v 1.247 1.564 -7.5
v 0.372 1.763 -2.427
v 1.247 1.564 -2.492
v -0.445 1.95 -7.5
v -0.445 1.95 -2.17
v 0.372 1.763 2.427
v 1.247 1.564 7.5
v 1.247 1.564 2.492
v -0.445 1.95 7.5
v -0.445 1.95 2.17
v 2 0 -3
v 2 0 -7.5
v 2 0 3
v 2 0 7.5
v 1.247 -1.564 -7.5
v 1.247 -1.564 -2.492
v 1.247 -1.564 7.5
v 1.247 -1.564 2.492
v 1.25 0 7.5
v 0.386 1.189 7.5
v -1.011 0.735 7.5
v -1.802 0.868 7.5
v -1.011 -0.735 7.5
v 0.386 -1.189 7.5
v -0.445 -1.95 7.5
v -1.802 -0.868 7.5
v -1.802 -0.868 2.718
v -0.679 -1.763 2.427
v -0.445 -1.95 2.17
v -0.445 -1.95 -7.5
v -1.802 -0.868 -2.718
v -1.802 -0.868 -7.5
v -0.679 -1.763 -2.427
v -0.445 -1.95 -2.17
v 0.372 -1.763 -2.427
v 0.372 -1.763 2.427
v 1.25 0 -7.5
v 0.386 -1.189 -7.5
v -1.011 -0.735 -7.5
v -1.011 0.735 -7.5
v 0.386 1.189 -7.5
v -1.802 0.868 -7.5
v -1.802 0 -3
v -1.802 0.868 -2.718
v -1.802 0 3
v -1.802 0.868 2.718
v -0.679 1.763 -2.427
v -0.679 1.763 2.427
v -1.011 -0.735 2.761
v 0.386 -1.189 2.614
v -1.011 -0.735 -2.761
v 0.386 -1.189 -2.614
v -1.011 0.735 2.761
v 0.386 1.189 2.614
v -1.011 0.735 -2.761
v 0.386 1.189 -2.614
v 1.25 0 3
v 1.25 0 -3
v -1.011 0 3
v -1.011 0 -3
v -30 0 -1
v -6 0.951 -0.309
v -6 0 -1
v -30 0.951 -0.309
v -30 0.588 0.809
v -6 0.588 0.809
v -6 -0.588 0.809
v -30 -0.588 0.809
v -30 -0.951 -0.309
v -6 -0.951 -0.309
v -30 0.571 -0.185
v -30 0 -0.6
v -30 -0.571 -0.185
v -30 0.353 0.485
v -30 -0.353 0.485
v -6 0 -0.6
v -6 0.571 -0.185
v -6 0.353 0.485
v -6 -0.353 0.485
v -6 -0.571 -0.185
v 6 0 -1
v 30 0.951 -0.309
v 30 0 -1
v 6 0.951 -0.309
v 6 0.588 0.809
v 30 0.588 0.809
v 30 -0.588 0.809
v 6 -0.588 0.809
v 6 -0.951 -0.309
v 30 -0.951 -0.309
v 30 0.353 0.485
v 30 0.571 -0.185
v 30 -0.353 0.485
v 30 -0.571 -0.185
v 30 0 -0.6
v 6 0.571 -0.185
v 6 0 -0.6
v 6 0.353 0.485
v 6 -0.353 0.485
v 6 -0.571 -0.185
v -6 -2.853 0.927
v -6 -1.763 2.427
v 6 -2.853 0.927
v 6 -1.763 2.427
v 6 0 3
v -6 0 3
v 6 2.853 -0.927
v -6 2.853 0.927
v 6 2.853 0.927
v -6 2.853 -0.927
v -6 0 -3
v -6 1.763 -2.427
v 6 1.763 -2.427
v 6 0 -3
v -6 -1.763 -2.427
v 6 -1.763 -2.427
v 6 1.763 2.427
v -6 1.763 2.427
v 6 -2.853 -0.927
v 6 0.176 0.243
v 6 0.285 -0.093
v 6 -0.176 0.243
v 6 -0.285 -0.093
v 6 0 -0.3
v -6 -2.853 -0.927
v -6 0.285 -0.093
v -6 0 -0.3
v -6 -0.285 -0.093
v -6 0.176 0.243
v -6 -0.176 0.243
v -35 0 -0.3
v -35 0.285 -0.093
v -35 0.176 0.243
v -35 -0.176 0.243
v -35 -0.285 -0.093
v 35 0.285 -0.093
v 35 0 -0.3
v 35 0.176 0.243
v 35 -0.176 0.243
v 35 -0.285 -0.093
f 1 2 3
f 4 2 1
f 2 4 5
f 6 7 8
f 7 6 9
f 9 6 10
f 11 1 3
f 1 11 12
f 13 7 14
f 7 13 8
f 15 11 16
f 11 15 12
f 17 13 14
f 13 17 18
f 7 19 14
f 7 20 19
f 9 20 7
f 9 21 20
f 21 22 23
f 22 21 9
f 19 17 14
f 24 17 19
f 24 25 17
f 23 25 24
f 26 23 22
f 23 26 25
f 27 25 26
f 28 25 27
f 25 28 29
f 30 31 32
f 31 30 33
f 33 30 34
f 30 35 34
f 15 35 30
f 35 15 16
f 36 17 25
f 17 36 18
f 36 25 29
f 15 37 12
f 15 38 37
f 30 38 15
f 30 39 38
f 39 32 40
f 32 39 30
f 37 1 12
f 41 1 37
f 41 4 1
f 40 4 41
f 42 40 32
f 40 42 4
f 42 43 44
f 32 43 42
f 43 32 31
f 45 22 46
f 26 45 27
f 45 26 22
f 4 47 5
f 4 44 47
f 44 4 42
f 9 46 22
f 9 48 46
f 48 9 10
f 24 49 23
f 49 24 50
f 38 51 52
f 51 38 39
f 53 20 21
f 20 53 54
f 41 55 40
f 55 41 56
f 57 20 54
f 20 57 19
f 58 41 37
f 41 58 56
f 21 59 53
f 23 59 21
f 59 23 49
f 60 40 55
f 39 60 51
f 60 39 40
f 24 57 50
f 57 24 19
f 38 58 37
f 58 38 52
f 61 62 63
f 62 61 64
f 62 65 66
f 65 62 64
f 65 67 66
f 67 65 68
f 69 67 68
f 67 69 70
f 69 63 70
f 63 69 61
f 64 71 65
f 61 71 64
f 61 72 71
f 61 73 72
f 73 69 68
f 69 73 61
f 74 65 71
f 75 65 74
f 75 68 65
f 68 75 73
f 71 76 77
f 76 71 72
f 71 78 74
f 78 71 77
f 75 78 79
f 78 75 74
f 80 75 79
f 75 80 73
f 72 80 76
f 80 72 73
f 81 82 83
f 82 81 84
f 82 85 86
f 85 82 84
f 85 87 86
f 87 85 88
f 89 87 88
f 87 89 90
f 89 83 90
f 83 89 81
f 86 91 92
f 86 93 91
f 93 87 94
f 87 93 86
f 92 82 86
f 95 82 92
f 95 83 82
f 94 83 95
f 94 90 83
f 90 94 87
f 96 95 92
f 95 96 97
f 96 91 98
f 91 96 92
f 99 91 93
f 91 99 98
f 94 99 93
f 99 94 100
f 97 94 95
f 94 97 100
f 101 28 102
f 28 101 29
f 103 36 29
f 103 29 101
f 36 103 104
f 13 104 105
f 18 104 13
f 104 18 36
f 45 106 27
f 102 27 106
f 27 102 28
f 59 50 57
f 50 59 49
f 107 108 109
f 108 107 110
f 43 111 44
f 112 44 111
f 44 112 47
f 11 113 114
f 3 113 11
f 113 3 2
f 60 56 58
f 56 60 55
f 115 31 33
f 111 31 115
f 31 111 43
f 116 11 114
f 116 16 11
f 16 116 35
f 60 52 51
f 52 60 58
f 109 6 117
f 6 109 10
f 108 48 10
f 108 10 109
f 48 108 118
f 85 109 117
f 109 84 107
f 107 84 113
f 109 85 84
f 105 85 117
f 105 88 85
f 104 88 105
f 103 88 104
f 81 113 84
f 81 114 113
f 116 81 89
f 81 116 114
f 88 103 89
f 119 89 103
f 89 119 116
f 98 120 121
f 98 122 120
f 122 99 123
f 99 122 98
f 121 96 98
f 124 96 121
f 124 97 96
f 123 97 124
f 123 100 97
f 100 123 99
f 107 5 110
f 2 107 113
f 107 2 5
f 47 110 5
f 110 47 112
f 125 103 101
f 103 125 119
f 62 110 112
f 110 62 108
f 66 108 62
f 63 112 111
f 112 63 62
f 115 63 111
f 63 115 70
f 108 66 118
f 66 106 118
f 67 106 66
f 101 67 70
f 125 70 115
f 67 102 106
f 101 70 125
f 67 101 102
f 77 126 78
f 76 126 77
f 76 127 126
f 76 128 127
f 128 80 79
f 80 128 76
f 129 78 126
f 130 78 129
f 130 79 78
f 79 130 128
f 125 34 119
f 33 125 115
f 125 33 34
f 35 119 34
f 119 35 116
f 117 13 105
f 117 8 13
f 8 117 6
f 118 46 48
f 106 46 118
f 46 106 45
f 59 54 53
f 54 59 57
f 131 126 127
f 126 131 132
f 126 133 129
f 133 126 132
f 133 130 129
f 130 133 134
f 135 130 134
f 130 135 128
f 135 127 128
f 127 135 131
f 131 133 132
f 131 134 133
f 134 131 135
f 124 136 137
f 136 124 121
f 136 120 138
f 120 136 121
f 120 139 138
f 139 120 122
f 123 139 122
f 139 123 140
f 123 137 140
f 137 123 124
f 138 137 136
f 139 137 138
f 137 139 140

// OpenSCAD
// Parameters
length = 15; //[8:30:1]
forced_id = 0; //[0:10:1]
center = true; //[0:1:1]
default_id = 2.5; //[1.25:5:0.1]
default_od = 4; //[2:8:0.1]
eps_overlap = 1; //[0.5:2:0.1]
res_body_d = 6; //[3:12:0.1]
res_body_l = 12; //[6:24:0.1]
lead_d = 0.6; //[0.3:1.2:0.05]
lead_total_l = 30; //[15:60:1]
bare_lead_l = 5; //[2:15:1]
sleeving_id = 1.2; //[0.8:3:0.1]
sleeving_od = 2; //[1.2:4:0.1]

// Tubing - complete detailed geometry
module tubing() {
  color([0.85, 0.85, 0.8]) {
    difference() {
      cylinder(h=length, r=((forced_id>0)?(default_od + forced_id - default_id):default_od)/2, center=center);
      translate([0, 0, -eps_overlap])
        cylinder(h=length + 2*eps_overlap, r=((forced_id>0)?forced_id:default_id)/2, center=center);
    }
  }
}

// Sleeved Resistor - complete detailed geometry
module sleeved_resistor() {
  color("DimGray") {
    // Resistor body
    rotate([0, 90, 0])
      cylinder(h=res_body_l, r=res_body_d/2, center=center);
    
    // Leads
    translate([-(res_body_l/2 + lead_total_l/2 - eps_overlap), 0, 0])
      rotate([0, 90, 0])
      cylinder(h=lead_total_l, r=lead_d/2, center=center);
    translate([(res_body_l/2 + lead_total_l/2 - eps_overlap), 0, 0])
      rotate([0, 90, 0])
      cylinder(h=lead_total_l, r=lead_d/2, center=center);
    
    // Sleeving
    color([0.85, 0.85, 0.8]) {
      difference() {
        translate([-(res_body_l/2 + (lead_total_l - bare_lead_l)/2 - eps_overlap), 0, 0])
          rotate([0, 90, 0])
          cylinder(h=(lead_total_l - bare_lead_l), r=sleeving_od/2, center=center);
        translate([-(res_body_l/2 + (lead_total_l - bare_lead_l)/2 - eps_overlap), 0, 0])
          rotate([0, 90, 0])
          cylinder(h=(lead_total_l - bare_lead_l) + 2*eps_overlap, r=sleeving_id/2, center=center);
      }
      difference() {
        translate([(res_body_l/2 + (lead_total_l - bare_lead_l)/2 - eps_overlap), 0, 0])
          rotate([0, 90, 0])
          cylinder(h=(lead_total_l - bare_lead_l), r=sleeving_od/2, center=center);
        translate([(res_body_l/2 + (lead_total_l - bare_lead_l)/2 - eps_overlap), 0, 0])
          rotate([0, 90, 0])
          cylinder(h=(lead_total_l - bare_lead_l) + 2*eps_overlap, r=sleeving_id/2, center=center);
      }
    }
  }
}

// Assembly
module assembly() {
  tubing();
  sleeved_resistor();
}

assembly();
